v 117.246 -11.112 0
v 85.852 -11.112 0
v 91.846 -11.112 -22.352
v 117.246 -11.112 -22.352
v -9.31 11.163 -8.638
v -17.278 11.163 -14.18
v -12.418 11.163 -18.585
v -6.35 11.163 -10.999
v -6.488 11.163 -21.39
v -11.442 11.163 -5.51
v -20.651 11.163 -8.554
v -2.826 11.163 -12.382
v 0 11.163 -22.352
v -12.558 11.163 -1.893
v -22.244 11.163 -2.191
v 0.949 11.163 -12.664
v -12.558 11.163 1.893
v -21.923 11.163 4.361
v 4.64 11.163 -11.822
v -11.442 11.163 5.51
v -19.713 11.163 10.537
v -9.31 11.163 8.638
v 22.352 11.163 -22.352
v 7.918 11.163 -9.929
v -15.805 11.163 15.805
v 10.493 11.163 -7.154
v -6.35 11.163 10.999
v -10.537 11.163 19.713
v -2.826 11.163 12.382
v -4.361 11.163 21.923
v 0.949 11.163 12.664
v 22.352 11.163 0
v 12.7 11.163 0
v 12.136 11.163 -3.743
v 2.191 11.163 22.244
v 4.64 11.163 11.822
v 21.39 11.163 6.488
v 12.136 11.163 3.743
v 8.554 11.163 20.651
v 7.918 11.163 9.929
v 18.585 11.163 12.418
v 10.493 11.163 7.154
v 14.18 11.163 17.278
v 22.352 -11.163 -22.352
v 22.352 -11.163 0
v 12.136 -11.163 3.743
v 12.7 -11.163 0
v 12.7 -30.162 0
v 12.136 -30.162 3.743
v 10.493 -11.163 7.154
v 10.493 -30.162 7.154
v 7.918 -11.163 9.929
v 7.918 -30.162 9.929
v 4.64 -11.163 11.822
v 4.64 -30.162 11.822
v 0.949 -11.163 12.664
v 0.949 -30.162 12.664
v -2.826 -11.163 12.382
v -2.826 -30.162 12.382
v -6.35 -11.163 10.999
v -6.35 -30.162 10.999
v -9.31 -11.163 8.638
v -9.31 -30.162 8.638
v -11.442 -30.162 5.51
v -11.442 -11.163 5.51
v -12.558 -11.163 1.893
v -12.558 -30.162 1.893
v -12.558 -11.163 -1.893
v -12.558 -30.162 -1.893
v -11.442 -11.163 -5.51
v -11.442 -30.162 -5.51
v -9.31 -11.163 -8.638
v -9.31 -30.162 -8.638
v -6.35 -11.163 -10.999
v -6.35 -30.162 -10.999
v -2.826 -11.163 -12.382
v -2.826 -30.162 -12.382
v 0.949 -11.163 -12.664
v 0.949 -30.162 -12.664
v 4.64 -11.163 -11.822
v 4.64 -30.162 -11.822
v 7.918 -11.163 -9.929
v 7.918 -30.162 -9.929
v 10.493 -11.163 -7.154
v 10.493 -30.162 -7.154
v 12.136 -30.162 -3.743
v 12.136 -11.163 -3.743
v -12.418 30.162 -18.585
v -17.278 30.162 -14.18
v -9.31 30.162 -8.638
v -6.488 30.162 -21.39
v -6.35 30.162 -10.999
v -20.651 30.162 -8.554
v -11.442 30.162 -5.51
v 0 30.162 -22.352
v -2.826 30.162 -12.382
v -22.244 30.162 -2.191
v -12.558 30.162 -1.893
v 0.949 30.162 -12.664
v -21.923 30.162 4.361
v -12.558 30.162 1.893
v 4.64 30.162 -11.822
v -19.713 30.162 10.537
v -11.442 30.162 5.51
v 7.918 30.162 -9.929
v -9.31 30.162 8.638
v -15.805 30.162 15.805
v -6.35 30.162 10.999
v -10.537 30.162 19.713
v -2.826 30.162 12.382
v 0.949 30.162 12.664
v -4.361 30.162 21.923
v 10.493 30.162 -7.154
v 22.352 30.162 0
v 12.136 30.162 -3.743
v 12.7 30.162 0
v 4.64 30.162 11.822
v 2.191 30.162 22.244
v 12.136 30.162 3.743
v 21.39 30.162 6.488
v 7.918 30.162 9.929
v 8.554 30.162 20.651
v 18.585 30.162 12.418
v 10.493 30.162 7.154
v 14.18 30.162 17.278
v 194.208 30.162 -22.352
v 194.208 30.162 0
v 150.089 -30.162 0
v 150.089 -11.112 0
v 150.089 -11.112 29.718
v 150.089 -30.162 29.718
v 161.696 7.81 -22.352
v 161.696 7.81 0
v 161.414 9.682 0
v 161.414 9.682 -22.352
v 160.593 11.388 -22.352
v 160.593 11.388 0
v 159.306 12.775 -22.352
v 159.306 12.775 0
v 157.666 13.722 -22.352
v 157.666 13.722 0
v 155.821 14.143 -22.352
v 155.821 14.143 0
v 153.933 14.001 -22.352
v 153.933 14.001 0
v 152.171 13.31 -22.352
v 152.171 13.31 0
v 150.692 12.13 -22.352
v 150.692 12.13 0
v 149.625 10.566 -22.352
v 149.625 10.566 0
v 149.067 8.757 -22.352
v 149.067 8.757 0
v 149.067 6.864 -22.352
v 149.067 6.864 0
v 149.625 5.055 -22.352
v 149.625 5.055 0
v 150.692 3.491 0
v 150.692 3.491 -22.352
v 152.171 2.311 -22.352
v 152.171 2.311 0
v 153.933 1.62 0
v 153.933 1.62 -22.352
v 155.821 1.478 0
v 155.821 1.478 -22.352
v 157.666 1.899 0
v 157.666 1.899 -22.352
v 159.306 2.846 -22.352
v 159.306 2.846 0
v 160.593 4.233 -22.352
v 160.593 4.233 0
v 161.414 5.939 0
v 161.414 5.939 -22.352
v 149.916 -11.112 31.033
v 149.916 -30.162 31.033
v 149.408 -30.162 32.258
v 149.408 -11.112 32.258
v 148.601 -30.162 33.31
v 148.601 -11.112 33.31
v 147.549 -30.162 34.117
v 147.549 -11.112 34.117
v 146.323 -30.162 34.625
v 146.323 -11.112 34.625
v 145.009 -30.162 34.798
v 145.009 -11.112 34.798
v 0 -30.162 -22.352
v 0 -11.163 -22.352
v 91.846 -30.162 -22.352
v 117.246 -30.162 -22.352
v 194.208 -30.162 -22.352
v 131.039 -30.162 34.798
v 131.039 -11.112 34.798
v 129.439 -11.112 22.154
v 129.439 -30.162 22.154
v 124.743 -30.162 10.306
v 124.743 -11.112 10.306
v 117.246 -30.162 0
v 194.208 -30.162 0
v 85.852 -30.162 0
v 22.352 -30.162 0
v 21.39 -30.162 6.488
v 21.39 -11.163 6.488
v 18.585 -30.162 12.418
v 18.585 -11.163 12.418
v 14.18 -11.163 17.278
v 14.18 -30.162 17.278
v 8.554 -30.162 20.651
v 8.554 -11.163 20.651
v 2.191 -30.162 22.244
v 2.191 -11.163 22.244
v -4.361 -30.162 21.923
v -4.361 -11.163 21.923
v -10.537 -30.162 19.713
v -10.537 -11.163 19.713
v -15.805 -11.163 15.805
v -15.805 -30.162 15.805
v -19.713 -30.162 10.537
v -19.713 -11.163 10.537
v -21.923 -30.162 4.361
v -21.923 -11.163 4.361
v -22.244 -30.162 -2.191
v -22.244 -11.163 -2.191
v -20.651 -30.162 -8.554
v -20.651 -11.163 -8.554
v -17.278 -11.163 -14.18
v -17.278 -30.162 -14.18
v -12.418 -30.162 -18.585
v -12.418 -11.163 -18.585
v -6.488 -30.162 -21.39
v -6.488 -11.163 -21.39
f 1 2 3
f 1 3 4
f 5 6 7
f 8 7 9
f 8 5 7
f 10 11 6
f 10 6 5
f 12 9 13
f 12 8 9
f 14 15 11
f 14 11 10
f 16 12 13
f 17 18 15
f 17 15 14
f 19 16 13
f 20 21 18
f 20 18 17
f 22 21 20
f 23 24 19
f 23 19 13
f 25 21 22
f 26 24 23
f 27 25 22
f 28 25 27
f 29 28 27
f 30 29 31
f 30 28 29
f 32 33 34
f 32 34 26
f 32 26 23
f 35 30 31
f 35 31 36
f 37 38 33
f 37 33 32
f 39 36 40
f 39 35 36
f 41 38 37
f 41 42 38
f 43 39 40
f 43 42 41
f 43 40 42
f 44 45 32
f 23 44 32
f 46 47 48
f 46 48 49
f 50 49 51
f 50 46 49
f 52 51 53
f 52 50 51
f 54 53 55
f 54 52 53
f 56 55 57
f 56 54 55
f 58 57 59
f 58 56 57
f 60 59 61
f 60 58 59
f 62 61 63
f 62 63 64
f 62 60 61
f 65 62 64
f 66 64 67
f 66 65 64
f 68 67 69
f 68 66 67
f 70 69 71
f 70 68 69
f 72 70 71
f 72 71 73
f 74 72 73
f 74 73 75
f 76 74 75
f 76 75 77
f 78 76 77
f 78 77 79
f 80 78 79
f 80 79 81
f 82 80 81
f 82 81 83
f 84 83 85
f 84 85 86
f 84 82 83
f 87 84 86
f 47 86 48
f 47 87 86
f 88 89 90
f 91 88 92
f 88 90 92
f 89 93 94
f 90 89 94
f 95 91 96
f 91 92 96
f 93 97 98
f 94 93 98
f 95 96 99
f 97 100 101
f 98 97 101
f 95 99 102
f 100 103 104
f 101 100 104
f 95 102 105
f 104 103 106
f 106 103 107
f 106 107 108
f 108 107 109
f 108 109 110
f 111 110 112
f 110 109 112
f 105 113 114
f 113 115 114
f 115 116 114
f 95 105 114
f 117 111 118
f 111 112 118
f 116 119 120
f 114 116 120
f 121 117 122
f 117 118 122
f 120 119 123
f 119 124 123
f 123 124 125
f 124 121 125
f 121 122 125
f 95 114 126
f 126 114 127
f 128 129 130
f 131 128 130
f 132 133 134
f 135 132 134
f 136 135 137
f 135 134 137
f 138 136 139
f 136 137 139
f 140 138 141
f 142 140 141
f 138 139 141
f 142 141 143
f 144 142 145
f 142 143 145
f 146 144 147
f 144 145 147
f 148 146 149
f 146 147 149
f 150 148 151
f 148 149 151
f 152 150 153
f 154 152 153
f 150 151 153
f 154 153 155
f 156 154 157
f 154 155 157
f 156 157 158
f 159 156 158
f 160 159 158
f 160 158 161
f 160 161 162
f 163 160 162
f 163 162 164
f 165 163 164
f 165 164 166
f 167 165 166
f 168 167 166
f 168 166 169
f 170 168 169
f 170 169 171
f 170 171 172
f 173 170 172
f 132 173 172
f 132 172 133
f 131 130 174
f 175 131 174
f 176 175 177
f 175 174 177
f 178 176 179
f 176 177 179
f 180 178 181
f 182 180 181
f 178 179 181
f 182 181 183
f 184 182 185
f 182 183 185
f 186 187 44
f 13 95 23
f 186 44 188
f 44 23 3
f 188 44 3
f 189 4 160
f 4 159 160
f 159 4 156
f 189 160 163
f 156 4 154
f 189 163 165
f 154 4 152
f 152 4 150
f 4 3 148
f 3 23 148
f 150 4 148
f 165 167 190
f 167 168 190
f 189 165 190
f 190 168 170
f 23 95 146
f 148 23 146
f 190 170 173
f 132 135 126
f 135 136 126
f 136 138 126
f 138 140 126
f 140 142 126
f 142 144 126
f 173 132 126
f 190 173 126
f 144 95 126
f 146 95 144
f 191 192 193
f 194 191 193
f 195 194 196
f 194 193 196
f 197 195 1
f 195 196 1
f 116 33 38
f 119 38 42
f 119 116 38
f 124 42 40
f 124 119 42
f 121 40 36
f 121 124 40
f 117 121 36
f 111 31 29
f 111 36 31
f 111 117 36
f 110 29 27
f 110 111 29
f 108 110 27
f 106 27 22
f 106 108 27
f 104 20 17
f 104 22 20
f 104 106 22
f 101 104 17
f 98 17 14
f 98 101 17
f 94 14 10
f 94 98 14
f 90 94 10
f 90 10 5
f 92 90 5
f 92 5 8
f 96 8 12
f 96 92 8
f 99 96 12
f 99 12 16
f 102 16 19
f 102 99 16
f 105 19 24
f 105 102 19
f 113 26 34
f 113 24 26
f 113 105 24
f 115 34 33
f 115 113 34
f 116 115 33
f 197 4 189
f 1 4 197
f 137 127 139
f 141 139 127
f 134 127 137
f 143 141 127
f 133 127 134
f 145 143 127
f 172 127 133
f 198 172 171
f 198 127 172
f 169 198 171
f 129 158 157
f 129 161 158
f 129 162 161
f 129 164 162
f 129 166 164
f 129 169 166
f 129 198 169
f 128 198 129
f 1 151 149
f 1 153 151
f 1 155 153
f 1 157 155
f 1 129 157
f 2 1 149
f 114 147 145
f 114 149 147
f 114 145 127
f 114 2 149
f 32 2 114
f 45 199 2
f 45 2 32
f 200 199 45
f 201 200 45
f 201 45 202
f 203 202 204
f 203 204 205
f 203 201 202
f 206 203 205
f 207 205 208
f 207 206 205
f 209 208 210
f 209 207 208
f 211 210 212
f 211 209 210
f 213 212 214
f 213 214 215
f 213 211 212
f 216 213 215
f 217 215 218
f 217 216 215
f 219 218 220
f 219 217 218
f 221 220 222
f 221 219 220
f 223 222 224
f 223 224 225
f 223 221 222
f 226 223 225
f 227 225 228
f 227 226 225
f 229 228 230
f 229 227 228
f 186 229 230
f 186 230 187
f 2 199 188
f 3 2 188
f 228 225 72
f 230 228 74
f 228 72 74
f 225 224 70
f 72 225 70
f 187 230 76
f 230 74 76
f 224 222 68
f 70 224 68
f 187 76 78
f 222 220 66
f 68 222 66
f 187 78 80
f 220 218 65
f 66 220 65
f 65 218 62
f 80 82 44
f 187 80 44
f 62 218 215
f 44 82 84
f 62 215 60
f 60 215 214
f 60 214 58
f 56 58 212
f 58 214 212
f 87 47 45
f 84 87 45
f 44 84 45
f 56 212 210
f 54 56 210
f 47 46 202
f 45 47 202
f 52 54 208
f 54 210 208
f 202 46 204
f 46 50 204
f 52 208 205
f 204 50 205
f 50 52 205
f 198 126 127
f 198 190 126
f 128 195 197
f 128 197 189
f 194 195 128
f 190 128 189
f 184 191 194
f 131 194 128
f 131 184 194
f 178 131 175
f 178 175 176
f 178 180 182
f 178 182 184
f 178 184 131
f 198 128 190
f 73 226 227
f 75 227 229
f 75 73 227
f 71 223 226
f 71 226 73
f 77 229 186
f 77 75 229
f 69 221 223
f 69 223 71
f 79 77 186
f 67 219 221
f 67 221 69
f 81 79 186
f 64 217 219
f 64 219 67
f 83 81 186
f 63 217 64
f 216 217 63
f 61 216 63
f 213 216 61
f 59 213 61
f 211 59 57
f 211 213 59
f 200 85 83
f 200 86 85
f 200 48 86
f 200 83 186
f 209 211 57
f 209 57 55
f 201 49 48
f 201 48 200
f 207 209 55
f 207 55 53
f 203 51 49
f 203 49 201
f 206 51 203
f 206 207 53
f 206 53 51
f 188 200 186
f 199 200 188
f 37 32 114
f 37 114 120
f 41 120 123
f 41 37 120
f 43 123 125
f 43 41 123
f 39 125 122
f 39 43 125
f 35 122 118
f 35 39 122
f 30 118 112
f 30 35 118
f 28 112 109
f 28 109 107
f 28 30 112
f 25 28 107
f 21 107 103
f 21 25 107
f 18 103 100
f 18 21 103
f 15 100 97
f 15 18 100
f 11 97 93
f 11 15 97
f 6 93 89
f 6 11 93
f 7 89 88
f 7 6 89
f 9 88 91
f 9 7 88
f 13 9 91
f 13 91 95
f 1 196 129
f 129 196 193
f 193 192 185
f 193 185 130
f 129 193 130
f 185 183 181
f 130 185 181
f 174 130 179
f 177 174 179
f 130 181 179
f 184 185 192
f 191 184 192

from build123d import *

# Parameters (mm, degrees)
F0_R      = 12.7
F1_DEPTH  = 30.1625
F3_DEPTH  = 19.05
F4_W      = 32.8422
F4_H      = 22.352
F5_DEPTH  = 19.05
F6_R      = 6.35
F7_DEPTH  = 22.353
F9_W      = 44.704
F9_H      = 22.3266
F10_DEPTH = 149.353


with BuildPart() as f1:
    # F0 (on Front) → F1 (new body, symmetric)
    with BuildSketch(Plane.XZ):
        with BuildLine():
            Line((194.2084, 0), (22.352, 0))
            ThreePointArc((22.352, 0), (-15.805251, 15.805251), (0, -22.352))
            Line((0, -22.352), (194.2084, -22.352))
            Line((194.2084, -22.352), (194.2084, 0))
        make_face()
        Circle(F0_R, mode=Mode.SUBTRACT)
    extrude(amount=F1_DEPTH, both=True)

    # F2 (on face) → F3 (cut)
    with BuildSketch(Plane.XZ.offset(30.1625)):
        Polygon((91.8464, -22.352), (150.0886, -22.352), (150.0886, 0), (85.852, 0), align=None)
    extrude(amount=-F3_DEPTH, mode=Mode.SUBTRACT)

    # F4 (on face) → F5 (join)
    with BuildSketch(Plane.XZ.offset(11.1125)):
        with BuildLine():
            Line((117.2464, 0), (150.0886, 0))
            Line((150.0886, 0), (150.0886, 29.718))
            ThreePointArc((150.0886, 29.718), (148.600702, 33.310102), (145.0086, 34.798))
            Line((145.0086, 34.798), (131.0386, 34.798))
            ThreePointArc((131.0386, 34.798), (127.464415, 16.082358), (117.2464, 0))
        make_face()
        with Locations((133.6675, -11.176)):
            Rectangle(F4_W, F4_H)
    extrude(amount=F5_DEPTH)

    # F6 (on Top) → F7 (cut, through all)
    with BuildSketch(Plane.XY):
        with Locations((155.3464, 7.8105)):
            Circle(F6_R)
    extrude(amount=-F7_DEPTH, mode=Mode.SUBTRACT)

    # F9 (on offset) → F10 (cut, through all)
    with BuildSketch(Plane.XY.offset(127)):
        Rectangle(F9_W, F9_H)
    extrude(amount=-F10_DEPTH, mode=Mode.SUBTRACT)


solid = f1.part
